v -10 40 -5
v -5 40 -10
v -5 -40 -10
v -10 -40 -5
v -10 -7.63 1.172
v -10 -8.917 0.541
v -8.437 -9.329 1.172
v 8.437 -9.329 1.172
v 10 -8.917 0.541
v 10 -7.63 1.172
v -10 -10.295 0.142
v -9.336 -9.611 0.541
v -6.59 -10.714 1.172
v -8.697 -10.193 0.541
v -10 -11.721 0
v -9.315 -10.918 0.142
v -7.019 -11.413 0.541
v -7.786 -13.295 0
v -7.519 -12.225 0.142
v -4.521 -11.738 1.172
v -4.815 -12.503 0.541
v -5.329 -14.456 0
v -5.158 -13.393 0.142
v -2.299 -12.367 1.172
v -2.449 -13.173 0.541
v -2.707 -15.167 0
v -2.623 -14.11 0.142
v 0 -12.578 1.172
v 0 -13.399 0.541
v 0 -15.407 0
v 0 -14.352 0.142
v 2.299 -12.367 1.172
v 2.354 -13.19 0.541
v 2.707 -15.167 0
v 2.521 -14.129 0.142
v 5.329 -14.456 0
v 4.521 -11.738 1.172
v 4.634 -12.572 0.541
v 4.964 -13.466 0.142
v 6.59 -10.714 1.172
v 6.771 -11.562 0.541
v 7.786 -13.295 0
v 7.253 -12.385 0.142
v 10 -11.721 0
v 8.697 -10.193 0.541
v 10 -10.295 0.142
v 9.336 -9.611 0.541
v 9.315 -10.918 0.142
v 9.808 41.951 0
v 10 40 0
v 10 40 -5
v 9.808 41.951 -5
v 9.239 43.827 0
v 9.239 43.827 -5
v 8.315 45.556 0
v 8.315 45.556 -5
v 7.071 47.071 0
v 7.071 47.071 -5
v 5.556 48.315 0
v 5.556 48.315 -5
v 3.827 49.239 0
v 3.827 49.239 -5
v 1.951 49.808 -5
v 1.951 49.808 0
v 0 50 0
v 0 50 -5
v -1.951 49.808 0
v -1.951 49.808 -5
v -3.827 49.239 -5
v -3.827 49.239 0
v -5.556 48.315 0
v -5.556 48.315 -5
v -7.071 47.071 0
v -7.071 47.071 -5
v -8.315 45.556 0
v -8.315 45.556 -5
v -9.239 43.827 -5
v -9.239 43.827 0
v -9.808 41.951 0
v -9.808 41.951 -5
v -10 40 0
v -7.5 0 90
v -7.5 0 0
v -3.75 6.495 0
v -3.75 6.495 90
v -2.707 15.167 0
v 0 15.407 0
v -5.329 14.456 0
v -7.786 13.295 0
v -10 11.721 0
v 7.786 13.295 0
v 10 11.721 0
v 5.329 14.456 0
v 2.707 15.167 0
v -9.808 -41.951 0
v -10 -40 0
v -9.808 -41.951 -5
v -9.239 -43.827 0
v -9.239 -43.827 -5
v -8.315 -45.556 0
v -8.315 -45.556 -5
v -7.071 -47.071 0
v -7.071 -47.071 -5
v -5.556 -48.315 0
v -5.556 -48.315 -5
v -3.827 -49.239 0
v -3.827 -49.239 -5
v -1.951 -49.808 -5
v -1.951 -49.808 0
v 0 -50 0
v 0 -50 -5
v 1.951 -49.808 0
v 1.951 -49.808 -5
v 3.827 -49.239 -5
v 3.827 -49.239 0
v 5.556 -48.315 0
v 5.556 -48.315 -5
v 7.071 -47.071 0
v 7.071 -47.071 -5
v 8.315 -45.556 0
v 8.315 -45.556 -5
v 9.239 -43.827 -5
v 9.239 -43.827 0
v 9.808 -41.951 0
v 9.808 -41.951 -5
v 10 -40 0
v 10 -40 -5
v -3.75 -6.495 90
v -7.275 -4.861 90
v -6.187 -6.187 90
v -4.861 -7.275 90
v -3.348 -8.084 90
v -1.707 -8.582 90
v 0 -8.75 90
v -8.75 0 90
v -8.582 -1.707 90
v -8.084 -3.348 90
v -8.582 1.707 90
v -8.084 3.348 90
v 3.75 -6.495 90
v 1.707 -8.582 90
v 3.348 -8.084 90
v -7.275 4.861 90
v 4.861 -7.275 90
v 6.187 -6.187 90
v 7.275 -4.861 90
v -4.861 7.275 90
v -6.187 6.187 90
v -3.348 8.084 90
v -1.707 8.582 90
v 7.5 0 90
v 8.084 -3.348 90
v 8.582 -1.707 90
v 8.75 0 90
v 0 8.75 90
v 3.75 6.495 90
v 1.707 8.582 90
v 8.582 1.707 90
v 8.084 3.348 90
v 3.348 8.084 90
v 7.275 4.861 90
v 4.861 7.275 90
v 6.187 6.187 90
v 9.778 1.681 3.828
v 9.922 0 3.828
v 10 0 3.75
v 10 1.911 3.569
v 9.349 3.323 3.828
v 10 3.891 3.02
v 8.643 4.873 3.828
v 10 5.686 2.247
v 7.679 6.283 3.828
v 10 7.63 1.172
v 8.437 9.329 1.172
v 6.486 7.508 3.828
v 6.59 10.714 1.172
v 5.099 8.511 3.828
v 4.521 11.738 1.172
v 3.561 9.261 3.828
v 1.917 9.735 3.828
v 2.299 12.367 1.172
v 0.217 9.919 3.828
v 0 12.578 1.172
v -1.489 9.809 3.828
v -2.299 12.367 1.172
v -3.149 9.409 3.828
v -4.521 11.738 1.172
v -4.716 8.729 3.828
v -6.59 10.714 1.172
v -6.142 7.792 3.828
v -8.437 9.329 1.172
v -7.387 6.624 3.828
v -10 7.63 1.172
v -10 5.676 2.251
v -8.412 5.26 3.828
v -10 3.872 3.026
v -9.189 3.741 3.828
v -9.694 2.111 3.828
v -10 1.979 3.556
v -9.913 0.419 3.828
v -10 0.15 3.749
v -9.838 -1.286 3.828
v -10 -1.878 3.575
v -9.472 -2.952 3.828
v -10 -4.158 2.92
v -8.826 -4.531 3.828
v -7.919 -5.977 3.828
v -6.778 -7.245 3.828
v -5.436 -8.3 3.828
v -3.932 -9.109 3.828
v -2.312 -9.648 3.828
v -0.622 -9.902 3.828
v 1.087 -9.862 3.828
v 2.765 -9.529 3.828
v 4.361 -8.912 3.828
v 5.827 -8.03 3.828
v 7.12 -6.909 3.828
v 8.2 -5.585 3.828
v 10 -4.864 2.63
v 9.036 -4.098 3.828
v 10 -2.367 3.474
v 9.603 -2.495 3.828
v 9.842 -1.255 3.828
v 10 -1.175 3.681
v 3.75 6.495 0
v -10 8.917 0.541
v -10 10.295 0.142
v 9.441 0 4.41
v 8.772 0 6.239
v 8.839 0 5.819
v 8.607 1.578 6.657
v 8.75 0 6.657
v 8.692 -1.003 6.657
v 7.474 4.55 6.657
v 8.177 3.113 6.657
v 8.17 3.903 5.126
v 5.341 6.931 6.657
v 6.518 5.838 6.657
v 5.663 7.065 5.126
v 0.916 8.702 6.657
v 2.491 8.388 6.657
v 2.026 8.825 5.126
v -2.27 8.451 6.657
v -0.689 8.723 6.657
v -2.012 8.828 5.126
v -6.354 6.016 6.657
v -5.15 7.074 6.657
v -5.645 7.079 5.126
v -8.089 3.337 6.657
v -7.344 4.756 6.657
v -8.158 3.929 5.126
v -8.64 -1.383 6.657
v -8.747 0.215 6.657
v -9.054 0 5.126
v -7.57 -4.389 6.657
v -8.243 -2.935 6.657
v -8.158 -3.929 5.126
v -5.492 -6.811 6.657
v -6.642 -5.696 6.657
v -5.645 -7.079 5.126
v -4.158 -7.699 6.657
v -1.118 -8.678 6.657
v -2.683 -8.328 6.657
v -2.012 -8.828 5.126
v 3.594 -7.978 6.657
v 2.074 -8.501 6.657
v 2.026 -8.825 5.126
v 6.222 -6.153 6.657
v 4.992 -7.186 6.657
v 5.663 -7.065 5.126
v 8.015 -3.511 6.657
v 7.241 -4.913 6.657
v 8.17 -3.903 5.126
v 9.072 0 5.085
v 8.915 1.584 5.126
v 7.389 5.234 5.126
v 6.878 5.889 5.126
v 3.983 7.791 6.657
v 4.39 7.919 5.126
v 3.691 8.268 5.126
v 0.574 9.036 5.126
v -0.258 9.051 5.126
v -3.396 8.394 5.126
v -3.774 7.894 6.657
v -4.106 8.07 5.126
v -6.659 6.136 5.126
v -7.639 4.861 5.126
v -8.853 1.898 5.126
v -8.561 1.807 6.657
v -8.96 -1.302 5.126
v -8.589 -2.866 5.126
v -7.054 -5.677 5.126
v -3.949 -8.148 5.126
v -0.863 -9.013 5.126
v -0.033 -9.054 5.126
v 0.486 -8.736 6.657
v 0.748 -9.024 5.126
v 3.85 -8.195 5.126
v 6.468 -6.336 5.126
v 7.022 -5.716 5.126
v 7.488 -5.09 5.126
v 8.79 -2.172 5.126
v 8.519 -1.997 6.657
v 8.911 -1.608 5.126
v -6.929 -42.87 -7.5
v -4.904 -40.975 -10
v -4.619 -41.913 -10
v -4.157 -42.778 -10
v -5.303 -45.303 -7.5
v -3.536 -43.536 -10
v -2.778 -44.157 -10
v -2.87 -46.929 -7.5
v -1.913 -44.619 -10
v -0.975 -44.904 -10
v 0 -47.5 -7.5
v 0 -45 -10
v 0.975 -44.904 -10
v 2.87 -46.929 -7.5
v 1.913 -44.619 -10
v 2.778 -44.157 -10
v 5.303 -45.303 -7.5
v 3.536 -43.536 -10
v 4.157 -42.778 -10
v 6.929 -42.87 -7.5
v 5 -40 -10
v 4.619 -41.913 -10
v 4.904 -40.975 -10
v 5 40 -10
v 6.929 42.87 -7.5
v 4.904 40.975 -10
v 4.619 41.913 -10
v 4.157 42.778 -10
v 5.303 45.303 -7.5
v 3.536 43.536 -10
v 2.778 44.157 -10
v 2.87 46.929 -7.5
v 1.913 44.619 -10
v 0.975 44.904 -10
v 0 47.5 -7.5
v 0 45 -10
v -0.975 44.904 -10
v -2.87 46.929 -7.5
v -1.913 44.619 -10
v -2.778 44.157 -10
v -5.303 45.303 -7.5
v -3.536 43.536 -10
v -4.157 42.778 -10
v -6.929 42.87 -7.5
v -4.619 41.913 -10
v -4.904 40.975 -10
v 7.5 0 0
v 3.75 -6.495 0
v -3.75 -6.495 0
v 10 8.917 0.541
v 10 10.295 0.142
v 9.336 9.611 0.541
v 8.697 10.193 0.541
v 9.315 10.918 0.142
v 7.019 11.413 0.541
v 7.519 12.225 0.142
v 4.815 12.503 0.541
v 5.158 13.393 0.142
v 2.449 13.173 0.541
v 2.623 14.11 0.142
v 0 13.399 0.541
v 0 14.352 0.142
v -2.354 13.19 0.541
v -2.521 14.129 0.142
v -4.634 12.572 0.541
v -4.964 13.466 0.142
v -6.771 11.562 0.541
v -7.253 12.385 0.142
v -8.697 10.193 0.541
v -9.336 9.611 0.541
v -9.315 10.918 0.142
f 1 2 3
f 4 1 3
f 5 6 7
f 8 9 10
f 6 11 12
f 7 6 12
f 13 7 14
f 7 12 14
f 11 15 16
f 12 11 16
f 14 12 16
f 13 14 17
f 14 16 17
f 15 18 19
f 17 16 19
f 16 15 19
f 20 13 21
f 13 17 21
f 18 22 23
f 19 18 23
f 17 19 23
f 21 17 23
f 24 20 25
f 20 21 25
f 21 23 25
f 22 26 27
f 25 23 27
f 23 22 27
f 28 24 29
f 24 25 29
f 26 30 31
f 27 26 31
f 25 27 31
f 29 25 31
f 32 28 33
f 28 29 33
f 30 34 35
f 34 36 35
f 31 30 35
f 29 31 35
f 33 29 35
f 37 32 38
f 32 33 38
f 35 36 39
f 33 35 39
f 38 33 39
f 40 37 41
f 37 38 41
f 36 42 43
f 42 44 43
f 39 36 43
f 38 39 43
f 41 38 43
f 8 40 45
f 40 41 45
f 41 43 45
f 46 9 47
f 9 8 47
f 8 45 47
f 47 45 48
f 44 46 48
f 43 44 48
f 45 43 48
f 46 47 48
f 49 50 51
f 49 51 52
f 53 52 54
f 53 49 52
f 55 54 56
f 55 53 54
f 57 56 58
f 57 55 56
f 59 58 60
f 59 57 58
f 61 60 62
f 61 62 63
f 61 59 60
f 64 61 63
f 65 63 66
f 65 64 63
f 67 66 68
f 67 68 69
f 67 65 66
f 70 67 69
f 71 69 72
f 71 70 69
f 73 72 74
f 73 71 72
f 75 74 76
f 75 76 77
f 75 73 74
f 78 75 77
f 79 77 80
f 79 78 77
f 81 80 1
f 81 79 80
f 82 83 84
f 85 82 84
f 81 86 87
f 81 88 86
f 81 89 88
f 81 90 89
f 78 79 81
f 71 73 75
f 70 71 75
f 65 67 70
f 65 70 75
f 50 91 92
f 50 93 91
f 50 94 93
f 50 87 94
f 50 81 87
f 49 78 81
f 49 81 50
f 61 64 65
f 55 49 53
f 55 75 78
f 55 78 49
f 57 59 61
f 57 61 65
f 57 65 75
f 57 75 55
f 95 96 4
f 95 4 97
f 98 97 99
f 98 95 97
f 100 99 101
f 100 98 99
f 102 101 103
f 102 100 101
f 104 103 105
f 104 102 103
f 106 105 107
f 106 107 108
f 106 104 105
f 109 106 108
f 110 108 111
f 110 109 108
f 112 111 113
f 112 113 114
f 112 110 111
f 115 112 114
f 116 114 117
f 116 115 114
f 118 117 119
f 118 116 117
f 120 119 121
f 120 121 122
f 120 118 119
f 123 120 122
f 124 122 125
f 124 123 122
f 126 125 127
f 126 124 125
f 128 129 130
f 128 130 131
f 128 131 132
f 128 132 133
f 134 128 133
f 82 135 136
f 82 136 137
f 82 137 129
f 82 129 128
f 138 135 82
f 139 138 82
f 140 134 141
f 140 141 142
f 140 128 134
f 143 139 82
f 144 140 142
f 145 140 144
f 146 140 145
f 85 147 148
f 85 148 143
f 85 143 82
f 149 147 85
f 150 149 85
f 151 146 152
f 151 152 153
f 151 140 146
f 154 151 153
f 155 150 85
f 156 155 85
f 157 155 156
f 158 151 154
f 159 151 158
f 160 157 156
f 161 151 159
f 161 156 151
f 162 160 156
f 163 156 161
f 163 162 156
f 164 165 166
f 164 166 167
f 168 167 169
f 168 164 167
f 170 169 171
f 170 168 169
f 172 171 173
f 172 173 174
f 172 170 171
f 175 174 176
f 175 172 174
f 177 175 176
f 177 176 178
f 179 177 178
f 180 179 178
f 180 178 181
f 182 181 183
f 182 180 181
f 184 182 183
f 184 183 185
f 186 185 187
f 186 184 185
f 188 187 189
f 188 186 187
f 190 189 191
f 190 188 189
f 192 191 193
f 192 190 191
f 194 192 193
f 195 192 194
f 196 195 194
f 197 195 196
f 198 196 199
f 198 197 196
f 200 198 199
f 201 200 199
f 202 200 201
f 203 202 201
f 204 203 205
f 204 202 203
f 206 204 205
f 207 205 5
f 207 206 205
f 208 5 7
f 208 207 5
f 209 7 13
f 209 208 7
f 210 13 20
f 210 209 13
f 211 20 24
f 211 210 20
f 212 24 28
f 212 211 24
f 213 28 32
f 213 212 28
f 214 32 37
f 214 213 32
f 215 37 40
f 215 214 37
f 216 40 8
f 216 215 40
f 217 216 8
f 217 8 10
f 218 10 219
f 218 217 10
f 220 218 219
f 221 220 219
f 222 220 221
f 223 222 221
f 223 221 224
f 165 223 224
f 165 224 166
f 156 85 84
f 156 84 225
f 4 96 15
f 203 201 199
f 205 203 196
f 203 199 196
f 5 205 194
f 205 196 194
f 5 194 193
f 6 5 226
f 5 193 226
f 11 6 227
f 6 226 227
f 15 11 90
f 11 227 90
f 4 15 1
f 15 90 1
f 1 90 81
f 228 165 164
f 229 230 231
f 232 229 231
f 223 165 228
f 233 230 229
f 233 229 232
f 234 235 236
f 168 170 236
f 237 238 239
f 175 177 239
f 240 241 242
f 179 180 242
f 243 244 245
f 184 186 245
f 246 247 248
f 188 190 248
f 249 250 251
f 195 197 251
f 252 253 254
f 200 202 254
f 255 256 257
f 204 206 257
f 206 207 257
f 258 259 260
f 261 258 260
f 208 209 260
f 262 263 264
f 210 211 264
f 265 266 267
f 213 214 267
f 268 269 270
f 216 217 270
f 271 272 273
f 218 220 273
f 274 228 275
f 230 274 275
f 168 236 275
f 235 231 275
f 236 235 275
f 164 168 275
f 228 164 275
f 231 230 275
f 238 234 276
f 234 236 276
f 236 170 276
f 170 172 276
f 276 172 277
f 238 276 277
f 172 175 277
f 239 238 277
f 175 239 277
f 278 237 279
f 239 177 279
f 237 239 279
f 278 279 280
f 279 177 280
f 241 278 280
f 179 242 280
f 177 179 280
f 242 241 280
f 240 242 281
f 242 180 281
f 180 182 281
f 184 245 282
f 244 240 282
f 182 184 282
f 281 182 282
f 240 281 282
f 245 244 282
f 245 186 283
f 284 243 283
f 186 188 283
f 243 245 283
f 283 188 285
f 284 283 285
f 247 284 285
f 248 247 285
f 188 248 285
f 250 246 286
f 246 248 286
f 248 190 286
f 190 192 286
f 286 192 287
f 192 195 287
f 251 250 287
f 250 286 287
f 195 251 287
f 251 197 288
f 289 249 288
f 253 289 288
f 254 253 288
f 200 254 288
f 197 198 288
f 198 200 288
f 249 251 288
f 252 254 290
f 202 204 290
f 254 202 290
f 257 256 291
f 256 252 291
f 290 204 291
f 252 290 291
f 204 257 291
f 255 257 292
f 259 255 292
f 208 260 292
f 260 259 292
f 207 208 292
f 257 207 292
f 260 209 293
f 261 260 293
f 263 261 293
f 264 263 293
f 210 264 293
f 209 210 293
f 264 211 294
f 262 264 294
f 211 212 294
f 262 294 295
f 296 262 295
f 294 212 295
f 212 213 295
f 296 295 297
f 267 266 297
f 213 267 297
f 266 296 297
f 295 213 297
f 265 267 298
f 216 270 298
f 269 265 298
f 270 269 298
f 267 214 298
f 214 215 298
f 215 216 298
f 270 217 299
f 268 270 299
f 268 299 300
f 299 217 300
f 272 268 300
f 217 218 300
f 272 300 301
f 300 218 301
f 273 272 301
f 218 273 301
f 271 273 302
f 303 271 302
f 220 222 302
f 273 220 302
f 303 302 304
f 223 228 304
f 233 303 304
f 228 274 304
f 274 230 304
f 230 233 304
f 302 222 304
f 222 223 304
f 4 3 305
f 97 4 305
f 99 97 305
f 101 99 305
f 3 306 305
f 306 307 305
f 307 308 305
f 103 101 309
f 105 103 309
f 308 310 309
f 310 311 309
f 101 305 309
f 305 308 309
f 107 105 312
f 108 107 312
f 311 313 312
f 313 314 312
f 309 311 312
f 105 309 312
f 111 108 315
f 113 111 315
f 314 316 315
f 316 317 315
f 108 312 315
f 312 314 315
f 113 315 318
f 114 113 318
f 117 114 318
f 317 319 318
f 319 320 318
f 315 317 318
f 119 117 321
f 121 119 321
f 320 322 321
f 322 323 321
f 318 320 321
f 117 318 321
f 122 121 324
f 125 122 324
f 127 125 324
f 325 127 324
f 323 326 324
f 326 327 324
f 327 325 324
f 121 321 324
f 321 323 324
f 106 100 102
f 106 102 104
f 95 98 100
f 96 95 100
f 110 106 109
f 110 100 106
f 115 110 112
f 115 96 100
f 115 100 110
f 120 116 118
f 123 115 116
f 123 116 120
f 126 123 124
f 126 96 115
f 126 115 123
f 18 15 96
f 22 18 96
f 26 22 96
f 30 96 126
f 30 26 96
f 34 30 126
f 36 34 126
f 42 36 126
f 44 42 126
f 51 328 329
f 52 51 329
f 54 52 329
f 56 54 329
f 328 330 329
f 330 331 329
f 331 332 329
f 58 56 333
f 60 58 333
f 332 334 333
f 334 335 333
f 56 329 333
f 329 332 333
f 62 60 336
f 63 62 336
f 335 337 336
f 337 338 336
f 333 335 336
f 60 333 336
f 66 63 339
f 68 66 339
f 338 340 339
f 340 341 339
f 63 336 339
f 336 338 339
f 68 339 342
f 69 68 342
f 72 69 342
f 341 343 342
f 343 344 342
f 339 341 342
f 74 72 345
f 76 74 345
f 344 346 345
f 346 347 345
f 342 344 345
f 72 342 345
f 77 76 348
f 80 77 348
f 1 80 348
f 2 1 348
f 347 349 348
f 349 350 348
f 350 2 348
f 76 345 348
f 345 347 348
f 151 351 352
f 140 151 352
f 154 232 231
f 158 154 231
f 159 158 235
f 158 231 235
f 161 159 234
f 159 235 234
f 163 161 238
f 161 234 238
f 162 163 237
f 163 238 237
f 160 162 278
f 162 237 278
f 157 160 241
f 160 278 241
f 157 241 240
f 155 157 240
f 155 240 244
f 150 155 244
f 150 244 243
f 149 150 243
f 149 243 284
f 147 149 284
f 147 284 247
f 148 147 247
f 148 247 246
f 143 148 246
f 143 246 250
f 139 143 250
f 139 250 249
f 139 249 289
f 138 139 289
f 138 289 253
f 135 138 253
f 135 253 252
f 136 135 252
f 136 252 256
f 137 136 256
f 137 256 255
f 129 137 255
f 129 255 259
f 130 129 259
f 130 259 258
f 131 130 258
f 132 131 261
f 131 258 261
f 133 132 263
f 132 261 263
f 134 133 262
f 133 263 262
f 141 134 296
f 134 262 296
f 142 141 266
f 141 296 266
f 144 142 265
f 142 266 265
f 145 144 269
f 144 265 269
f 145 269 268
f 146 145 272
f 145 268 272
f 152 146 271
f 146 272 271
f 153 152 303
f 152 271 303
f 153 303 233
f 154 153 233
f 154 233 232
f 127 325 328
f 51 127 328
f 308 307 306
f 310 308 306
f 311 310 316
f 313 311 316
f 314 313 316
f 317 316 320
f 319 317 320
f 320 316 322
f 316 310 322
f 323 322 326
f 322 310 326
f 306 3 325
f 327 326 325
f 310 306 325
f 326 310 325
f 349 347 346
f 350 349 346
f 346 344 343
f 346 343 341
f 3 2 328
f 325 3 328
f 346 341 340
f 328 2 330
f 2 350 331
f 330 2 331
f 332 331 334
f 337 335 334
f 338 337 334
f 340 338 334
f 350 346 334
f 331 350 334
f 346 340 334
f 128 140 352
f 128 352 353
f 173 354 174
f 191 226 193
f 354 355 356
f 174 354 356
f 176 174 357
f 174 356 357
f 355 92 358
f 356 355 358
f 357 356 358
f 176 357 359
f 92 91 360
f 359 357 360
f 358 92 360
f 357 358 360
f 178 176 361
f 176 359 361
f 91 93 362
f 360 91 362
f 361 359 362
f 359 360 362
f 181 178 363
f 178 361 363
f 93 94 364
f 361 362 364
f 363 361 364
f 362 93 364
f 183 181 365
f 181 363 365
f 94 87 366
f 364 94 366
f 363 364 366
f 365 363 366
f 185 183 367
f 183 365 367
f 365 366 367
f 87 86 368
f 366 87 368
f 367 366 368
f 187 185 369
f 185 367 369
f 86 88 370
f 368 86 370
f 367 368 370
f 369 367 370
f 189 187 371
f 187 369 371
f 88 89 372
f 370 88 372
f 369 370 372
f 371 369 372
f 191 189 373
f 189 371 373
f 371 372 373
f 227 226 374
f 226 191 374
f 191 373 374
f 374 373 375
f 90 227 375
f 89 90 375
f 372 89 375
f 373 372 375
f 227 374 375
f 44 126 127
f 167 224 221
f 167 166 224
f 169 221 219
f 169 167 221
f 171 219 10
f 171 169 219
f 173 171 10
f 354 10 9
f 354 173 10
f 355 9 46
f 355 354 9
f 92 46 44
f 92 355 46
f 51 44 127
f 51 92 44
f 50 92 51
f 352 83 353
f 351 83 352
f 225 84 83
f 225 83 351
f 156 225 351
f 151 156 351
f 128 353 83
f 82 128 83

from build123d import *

# Parameters (mm, degrees)
F0_R     = 8.75
F1_DEPTH = 90
F3_DEPTH = 10
F5_R     = 4
F6_SIZE  = 5


# Not quite as in the source:
# - a fillet or chamfer that OpenCascade refuses, or shapes differently, is made with other operations: its cross-section is extruded or revolved along the edge and cut away or added


with BuildPart() as f1:
    # F0 (on Top) → F1 (new body)
    with BuildSketch(Plane.XY):
        Circle(F0_R)
        Polygon((3.75, 6.4951905284), (7.5, 0), (3.75, -6.4951905284), (-3.75, -6.4951905284), (-7.5, 0), (-3.75, 6.4951905284), align=None, mode=Mode.SUBTRACT)
    extrude(amount=F1_DEPTH)

    # F2 (on Top) → F3 (join)
    with BuildSketch(Plane.XY):
        with BuildLine():
            ThreePointArc((10, 40), (0, 50), (-10, 40))
            Line((-10, 40), (-10, 0))
            Line((-10, 0), (-10, -40))
            ThreePointArc((-10, -40), (0, -50), (10, -40))
            Line((10, -40), (10, 0))
            Line((10, 0), (10, 40))
        make_face()
    extrude(amount=-F3_DEPTH)

    # F4: chamfer of 5 on 1 edges, made by hand


with BuildPart() as f4_tool2:
    # F4_s3 → F4_t4 (revolve)
    with BuildSketch(Plane.XZ):
        Polygon((13.75, 0), (8.75, 5), (8.75, 0), align=None)
    revolve(axis=Axis((0, 0, 0), (0, 0, 1)))

    split(bisect_by=Plane.YZ.offset(10), keep=Keep.BOTTOM)

    split(bisect_by=Plane.YZ.offset(-10), keep=Keep.TOP)


with BuildPart() as f1_1:
    add(f1.part)

    # F4_t1: union F4_tool2
    add(f4_tool2.part)

    # F5
    f5_edges = [f1_1.edges().sort_by_distance(p)[0] for p in [
        (0, -13.75, 0),
        (0, 13.75, 0),
        (-8.75, 0, 5),
    ]]
    fillet(f5_edges, radius=F5_R)

    # F6
    f6_edges = [f1_1.edges().sort_by_distance(p)[0] for p in [
        (10, 0, -10),
    ]]
    chamfer(f6_edges, length=F6_SIZE)


solid = f1_1.part
